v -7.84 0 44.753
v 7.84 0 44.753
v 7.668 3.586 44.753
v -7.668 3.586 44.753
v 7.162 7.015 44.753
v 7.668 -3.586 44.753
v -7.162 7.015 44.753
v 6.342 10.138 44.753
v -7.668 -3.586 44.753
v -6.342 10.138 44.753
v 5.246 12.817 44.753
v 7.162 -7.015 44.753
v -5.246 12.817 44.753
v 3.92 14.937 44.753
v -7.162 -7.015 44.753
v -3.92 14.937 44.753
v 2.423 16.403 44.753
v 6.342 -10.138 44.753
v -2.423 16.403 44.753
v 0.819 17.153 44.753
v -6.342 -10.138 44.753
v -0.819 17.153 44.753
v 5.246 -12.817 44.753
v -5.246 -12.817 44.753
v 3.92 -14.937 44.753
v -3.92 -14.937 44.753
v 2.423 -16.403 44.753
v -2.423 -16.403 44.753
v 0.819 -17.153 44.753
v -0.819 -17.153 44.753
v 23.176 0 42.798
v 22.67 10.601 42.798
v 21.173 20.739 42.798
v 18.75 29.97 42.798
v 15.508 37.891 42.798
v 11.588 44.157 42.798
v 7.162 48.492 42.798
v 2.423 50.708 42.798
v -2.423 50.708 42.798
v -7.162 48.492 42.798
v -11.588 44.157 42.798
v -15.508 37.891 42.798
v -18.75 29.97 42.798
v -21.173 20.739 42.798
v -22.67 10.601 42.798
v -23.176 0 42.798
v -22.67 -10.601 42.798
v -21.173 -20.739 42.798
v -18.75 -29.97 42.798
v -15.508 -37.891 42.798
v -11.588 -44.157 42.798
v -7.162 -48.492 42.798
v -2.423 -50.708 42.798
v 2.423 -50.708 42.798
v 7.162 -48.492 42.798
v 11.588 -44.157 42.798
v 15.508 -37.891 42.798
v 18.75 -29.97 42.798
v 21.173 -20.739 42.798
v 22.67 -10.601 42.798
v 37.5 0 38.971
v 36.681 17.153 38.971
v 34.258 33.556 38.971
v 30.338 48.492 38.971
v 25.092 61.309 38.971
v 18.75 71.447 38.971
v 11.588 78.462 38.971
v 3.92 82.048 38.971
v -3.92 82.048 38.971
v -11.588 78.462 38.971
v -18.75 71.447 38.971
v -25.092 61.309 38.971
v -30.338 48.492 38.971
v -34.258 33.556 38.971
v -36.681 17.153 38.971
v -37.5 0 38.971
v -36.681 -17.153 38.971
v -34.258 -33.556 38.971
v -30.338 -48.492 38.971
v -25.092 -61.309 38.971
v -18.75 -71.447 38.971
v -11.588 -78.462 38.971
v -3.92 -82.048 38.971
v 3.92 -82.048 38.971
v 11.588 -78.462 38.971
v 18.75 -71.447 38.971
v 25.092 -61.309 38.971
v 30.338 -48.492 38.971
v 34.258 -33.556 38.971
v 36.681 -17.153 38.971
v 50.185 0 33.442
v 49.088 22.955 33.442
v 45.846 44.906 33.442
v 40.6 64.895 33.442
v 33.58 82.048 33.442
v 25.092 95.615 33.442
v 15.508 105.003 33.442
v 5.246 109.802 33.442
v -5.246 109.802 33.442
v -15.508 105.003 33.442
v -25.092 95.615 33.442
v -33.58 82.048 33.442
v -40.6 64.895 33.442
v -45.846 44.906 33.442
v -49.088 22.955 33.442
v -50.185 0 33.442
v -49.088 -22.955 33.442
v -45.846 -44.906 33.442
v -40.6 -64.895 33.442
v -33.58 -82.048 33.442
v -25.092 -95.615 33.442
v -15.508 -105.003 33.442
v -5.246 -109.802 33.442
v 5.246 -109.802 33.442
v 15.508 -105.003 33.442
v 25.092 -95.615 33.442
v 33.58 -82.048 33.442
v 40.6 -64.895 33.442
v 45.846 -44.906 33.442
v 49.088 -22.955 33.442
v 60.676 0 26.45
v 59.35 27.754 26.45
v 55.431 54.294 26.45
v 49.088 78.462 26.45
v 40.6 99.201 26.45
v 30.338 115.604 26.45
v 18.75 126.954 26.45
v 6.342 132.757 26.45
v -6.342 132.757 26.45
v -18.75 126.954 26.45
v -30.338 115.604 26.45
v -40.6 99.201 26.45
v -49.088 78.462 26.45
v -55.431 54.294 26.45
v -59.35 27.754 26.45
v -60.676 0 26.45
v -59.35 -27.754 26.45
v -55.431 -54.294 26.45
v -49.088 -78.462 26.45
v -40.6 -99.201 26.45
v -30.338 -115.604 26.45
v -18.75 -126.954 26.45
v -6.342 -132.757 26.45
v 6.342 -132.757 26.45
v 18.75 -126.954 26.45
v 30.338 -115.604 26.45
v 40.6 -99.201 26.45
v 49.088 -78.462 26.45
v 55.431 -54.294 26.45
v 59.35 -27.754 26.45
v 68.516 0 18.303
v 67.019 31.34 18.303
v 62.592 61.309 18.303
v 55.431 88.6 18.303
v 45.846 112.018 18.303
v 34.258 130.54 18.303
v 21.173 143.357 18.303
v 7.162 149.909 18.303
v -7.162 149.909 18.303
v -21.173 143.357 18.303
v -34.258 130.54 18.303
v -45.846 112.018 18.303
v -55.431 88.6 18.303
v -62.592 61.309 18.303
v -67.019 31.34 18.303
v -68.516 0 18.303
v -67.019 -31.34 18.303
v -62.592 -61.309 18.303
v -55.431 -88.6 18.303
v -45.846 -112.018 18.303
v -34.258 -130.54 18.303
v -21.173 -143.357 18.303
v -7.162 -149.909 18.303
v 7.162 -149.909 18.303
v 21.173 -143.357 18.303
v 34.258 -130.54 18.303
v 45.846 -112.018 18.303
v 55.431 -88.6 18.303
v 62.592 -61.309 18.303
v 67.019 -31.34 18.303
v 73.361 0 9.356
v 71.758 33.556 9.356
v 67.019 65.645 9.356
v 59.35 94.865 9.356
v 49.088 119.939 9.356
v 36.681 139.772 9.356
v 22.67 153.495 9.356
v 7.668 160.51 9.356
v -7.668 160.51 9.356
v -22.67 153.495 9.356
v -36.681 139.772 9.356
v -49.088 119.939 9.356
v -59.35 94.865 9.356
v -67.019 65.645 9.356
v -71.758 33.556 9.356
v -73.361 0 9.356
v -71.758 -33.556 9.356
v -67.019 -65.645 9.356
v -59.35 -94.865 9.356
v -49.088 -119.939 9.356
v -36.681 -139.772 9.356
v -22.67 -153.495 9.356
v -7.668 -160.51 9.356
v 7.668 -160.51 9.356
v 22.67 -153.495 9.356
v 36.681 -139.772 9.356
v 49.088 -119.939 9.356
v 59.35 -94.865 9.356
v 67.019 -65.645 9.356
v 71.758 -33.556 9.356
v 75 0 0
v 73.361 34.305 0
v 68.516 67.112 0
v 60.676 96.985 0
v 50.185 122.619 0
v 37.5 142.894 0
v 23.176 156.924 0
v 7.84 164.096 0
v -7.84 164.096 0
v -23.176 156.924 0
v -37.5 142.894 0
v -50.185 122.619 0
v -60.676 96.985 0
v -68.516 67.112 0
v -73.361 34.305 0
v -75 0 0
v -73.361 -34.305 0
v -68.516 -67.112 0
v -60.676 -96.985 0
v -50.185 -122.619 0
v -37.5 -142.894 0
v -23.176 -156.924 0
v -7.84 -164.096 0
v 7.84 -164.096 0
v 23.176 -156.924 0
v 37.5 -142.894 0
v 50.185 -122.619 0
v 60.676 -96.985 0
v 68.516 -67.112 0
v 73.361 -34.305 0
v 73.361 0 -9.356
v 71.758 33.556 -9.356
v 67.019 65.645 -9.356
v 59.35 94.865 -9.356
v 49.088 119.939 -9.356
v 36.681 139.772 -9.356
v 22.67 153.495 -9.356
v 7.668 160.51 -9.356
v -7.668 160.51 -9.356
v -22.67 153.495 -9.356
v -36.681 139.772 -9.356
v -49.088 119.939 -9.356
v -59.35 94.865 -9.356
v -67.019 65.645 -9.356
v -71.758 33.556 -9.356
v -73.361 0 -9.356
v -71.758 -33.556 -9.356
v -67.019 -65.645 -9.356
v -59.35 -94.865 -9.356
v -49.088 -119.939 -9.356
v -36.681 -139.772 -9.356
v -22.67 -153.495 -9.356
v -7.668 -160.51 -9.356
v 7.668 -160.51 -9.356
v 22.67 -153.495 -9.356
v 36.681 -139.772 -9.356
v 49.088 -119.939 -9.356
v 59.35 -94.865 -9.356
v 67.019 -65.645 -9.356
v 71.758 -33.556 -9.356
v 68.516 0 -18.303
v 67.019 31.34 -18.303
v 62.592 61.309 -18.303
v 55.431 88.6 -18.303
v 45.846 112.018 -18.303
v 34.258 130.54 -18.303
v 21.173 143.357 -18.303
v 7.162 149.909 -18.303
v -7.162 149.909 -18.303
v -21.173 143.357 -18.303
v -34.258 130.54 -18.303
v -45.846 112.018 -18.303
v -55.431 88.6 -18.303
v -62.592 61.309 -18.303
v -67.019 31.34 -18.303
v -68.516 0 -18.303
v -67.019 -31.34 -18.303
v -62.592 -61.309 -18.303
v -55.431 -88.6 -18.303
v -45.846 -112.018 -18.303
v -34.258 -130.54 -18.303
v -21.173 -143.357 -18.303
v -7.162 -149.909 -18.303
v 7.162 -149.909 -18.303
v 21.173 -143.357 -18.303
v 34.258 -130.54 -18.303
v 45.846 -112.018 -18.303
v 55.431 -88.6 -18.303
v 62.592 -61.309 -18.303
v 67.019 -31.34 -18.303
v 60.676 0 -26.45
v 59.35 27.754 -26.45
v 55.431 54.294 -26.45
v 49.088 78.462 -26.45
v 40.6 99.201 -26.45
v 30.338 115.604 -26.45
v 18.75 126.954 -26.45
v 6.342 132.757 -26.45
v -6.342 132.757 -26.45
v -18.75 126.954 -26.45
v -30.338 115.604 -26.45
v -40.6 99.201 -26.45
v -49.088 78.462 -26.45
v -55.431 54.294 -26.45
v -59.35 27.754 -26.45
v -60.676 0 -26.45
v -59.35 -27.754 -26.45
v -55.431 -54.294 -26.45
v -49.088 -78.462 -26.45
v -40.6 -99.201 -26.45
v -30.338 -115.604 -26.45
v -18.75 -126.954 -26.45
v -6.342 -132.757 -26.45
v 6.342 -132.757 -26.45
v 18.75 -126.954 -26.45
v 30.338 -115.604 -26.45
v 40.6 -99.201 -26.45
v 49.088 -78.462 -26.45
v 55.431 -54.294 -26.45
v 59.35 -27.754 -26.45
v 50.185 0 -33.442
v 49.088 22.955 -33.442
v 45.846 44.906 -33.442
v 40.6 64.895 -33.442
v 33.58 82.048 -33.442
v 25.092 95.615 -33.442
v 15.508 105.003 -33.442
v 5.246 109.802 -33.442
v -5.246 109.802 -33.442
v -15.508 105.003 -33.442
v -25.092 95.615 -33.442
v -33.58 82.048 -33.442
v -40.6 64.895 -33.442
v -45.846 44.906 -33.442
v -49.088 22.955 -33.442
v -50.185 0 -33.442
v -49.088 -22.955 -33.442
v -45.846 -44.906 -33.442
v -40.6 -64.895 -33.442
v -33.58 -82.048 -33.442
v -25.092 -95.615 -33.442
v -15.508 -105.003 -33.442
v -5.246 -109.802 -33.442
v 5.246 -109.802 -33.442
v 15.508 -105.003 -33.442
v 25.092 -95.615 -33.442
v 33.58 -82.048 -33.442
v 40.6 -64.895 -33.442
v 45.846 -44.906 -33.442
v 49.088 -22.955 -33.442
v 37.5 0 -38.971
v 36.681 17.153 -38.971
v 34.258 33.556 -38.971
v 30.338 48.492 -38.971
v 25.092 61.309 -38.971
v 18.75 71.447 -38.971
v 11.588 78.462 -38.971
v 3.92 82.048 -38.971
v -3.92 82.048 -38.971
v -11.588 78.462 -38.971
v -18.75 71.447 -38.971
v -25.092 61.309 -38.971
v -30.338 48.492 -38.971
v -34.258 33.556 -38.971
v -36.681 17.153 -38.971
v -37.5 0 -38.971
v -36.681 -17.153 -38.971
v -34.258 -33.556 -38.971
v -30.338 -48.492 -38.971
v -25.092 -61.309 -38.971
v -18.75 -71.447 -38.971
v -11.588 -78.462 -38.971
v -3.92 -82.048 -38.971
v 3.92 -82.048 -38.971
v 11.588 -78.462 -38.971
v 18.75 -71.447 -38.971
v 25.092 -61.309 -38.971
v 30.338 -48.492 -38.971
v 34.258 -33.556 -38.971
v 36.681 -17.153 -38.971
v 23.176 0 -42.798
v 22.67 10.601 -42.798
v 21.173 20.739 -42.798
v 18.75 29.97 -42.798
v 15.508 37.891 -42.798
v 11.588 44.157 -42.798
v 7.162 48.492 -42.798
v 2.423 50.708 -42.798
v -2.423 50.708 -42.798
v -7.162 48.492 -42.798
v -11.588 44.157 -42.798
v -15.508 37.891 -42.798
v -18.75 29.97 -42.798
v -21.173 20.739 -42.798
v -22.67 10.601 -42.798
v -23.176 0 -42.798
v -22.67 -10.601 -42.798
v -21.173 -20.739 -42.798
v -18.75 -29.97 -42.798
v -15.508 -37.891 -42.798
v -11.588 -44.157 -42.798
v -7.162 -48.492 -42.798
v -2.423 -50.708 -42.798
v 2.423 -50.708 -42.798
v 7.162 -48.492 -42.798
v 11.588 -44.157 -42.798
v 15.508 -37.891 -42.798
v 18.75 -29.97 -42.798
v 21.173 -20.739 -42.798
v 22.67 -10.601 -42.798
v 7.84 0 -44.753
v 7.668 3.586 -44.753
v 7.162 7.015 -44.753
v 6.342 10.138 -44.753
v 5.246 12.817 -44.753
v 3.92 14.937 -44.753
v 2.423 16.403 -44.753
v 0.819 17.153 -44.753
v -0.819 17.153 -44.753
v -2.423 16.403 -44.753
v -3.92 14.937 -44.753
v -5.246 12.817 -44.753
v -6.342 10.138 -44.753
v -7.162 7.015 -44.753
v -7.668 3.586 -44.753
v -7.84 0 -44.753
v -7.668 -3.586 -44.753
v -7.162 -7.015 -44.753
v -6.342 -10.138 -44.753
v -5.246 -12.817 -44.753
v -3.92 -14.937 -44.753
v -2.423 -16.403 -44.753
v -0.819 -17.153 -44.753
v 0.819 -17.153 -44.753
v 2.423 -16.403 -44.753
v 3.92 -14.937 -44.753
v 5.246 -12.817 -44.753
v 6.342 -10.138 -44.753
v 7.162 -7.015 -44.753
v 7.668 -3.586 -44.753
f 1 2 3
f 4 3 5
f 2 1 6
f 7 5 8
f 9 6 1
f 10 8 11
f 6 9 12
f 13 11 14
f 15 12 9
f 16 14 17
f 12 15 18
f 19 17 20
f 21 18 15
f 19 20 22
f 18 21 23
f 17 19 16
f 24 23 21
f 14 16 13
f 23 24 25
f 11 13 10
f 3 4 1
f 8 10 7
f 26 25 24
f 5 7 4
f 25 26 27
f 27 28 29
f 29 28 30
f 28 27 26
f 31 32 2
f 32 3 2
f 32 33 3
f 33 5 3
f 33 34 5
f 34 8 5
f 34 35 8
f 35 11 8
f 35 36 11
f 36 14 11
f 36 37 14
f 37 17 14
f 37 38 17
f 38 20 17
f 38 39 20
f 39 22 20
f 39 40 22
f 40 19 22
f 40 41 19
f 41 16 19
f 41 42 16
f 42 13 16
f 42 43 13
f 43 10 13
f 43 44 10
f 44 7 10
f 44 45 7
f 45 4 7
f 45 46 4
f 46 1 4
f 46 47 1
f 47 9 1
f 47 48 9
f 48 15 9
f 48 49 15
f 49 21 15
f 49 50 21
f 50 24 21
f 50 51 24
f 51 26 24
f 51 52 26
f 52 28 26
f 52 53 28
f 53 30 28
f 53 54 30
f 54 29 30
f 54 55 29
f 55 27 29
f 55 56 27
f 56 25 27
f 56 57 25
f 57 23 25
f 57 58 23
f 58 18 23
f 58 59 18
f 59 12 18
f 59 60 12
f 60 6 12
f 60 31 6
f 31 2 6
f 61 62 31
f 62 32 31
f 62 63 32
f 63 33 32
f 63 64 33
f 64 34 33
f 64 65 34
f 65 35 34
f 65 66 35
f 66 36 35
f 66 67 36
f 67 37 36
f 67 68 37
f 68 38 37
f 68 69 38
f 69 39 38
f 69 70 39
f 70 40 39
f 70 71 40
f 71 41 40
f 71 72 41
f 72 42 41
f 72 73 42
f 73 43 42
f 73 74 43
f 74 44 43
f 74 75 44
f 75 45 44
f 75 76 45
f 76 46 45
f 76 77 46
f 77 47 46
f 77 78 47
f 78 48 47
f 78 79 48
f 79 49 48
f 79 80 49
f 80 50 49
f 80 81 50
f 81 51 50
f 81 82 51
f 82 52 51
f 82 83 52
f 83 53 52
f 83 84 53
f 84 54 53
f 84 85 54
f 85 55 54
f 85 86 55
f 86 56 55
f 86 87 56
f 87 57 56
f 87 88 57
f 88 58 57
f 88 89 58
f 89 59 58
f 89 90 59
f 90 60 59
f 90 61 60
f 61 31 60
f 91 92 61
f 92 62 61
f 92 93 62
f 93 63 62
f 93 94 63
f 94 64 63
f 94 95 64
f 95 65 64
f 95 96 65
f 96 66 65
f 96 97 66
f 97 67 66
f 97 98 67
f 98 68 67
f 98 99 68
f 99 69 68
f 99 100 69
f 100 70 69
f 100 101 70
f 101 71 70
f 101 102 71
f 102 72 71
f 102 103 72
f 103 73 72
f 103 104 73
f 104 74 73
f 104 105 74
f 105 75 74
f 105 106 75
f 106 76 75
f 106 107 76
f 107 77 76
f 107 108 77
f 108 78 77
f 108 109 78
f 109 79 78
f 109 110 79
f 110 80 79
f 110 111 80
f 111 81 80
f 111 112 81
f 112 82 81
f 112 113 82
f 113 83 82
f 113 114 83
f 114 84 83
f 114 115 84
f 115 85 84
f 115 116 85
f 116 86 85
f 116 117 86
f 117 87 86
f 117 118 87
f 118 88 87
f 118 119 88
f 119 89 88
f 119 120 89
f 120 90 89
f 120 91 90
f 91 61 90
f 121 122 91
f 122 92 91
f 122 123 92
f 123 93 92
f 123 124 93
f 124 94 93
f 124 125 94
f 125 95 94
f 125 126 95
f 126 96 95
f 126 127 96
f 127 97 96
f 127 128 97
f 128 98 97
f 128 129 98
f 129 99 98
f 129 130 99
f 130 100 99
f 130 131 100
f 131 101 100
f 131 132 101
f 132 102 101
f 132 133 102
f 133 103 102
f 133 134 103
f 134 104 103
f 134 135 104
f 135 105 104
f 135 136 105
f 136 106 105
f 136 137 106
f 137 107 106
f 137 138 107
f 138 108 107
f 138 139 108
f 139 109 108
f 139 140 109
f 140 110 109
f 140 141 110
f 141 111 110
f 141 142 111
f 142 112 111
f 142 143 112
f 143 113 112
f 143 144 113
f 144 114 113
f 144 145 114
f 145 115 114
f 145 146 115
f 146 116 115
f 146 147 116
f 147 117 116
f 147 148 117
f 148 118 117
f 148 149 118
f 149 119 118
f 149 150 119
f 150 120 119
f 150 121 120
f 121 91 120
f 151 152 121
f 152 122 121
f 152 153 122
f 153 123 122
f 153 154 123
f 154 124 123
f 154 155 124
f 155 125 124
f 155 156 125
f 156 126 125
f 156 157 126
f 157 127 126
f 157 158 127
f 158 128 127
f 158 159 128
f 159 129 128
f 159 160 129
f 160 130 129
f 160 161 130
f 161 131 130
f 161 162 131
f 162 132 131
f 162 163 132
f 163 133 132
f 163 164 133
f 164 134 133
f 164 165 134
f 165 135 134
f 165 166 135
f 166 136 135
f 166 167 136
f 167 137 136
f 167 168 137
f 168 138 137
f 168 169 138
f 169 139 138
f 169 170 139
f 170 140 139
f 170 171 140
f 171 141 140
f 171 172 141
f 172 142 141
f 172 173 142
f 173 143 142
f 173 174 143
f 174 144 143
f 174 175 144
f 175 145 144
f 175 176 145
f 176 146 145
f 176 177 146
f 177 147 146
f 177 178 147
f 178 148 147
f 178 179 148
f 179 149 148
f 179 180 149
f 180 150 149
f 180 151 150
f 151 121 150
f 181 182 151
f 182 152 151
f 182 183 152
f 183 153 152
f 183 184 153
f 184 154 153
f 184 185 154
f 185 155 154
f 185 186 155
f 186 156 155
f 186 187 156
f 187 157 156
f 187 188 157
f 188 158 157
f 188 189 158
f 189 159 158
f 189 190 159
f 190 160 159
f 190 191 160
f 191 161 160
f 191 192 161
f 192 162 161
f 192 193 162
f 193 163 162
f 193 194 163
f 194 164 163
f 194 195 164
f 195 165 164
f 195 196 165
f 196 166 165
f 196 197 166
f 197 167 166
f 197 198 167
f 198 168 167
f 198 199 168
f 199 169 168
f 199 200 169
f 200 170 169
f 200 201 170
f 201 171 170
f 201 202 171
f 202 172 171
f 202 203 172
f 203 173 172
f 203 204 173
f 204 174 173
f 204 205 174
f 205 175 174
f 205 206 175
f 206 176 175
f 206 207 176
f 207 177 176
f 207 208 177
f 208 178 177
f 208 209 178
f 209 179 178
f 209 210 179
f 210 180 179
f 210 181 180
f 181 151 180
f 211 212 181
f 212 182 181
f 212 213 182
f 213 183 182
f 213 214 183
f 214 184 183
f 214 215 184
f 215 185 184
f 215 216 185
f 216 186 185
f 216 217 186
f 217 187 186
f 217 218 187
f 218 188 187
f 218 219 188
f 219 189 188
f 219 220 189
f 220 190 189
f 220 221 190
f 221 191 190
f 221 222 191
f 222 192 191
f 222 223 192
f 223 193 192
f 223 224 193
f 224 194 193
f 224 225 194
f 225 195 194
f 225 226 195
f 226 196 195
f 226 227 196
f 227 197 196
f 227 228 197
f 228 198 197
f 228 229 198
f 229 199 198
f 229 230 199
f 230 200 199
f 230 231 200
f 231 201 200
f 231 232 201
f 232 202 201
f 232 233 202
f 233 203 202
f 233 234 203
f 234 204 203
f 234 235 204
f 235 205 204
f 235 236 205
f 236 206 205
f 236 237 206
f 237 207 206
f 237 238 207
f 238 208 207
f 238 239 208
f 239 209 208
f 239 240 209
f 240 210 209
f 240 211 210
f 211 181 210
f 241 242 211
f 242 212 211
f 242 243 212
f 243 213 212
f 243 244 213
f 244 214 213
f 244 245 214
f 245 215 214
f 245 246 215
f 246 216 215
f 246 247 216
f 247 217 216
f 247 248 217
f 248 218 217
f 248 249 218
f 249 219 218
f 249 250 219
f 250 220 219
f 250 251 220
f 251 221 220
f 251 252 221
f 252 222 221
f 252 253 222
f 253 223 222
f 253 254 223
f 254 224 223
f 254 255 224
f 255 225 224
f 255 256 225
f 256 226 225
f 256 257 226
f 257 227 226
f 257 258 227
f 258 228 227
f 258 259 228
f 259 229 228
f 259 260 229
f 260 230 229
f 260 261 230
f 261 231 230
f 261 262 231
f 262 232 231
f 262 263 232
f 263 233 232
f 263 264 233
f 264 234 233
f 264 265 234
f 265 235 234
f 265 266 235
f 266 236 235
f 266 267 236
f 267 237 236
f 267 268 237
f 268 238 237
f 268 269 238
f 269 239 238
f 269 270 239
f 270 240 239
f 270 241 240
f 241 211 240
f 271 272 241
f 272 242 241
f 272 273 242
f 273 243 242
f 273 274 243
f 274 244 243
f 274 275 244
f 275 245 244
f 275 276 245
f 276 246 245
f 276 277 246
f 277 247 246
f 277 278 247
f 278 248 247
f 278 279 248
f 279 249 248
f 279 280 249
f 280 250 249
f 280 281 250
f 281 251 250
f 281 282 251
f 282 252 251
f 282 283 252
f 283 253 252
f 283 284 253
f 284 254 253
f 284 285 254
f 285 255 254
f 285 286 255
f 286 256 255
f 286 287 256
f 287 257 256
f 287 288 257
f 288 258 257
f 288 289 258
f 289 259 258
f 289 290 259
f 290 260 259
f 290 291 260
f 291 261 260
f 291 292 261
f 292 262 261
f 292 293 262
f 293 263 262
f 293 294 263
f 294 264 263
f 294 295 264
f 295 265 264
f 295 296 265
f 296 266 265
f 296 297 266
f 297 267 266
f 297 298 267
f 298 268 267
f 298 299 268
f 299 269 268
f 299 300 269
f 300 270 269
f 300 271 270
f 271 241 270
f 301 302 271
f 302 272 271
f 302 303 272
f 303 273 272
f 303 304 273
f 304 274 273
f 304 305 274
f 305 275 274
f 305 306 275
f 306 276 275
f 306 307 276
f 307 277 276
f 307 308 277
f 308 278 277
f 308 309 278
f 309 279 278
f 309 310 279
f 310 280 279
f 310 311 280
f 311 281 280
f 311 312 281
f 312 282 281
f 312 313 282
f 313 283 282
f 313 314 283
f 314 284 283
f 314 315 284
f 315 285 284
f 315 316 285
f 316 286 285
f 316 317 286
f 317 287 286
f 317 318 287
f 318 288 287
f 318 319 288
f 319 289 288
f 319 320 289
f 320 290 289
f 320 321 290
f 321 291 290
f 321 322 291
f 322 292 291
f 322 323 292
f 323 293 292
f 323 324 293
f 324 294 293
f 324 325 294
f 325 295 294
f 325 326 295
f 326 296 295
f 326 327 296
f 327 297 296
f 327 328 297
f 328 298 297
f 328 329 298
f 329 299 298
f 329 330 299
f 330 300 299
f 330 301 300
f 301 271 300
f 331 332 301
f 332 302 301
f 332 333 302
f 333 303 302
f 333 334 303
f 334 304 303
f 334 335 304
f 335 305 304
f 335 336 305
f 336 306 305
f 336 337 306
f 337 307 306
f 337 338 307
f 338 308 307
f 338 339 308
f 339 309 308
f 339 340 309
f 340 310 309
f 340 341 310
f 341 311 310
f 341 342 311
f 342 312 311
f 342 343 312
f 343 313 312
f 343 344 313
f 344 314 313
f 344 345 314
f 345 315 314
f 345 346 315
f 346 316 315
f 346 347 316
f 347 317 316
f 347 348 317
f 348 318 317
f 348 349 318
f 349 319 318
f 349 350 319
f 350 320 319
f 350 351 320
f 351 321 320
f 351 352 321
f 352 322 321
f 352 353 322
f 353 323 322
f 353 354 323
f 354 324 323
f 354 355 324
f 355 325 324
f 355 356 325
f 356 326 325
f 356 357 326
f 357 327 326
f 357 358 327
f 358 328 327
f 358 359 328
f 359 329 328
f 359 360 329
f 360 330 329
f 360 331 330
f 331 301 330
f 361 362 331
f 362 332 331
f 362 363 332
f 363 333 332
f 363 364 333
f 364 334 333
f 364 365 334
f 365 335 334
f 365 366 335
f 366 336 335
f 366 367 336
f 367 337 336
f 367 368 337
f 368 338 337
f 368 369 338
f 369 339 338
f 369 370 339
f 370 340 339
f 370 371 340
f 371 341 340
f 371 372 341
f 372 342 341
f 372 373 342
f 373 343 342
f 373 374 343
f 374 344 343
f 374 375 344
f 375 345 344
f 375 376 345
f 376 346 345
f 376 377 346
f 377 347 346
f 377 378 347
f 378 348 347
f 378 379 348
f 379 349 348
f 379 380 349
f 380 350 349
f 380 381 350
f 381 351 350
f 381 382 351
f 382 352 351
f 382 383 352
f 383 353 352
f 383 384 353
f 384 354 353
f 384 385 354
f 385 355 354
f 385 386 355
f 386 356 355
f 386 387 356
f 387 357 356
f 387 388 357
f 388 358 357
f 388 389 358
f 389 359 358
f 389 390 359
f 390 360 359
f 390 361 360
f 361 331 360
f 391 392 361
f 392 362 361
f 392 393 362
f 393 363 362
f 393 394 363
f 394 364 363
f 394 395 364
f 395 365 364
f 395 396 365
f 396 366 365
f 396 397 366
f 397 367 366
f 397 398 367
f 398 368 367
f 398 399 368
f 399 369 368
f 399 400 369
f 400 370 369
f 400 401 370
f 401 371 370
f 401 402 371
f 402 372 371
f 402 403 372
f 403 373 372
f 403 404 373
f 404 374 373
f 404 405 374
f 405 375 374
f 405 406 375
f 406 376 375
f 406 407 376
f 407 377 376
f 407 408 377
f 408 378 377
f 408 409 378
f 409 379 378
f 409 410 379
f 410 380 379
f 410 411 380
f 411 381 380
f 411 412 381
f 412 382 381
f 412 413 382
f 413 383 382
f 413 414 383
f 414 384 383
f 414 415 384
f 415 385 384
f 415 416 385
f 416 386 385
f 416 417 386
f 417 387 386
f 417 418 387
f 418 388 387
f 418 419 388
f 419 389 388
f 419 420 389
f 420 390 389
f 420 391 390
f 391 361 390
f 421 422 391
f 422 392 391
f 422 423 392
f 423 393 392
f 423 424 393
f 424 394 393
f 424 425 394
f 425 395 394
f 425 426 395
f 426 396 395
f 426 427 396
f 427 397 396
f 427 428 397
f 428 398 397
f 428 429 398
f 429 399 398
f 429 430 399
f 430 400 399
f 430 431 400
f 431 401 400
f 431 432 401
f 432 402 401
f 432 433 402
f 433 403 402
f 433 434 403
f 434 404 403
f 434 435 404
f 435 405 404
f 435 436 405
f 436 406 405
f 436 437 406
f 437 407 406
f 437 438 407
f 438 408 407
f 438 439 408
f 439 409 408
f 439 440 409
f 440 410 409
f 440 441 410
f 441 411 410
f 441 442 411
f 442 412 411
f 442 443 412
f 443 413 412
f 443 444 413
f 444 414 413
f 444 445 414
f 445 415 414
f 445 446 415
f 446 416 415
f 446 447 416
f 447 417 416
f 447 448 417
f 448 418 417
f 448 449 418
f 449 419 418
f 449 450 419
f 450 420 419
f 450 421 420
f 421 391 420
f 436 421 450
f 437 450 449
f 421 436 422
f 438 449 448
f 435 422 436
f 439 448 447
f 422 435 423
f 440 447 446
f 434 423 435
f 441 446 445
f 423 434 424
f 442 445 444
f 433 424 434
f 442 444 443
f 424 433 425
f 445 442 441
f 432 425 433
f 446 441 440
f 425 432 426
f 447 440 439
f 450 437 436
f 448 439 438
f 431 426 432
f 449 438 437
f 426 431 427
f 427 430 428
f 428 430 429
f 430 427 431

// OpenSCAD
// Generated by SolidPython 1.0.1 on 2020-07-29 00:46:46


scale(v = [5, 11, 3]) {
	sphere(r = 15);
}
/***********************************************
*********      SolidPython code:      **********
************************************************
 
# import packages: SolidPython
from solid import *
from solid.utils import *
from itertools import chain, combinations, permutations


class Resize:

    def __init__(self, scad_file):
        self.scad_file = scad_file
        #self.scad_file = import_scad(scad_file)
        # cone/cylinder param:
        self.r1 = 0
        self.r2 = 0
        self.h = 0
        # rectangular prism param:
        self.w = 0
        self.l = 0
        # ellipse param:
        self.r = 0

    # import OpenScad code (file name corresponds to shape)


    # classify shape + parameters
    def assign(self, param1, param2, param3):
        if self.scad_file == 'cone.scad':
            self.r1 = param1
            self.r2 = param2
            self.h = param3
        elif self.scad_file == 'cylinder.scad':
            self.r1 = param1
            self.r2 = param2
            self.h = param3
        elif self.scad_file == 'rectangularPrism.scad':
            self.h = param1
            self.l = param2
            self.w = param3
        else:
            self.r = param1
            self.h = param2

    # resize parameters
    def iterate(self):
        x = range(3, 20, 2)
        i = 1
        if self.scad_file == 'cone.scad':
            tempList = list(permutations(x, 2))
            for temp in tempList:
                param1 = temp[0]
                param2 = temp[1]
                filepath = 'produced_scad_files/' + 'cone' + str(param1) + '_' + str(param2) + '_' + '.scad'
                scad_render_to_file(cylinder(h=param1, r1=param2, r2=0), filepath)

        elif self.scad_file == 'cylinder.scad':
            tempList = list(permutations(x, 3))
            for temp in tempList:
                param1 = temp[0]
                param2 = temp[1]
                filepath = 'produced_scad_files/' + 'cylinder' + str(param1) + '_' + str(param2) + '_' + '.scad'
                scad_render_to_file(cylinder(h=param1, r1=param2, r2=param2), filepath)

        elif self.scad_file == 'rectangularPrism.scad':
            tempList = list(permutations(x, 3))
            for temp in tempList:
                param1 = temp[0]
                param2 = temp[1]
                param3 = temp[2]
                filepath = 'produced_scad_files/' + 'rectangularPrism' + str(param1) + '_' + str(param2) + '_' + str(
                    param3) + '.scad'
                scad_render_to_file(cube(size=(param1, param2, param3)), filepath)

        elif self.scad_file == 'ellipse.scad':
            tempList = list(permutations(x, 4))
            for temp in tempList:
                param1 = temp[0]
                param2 = temp[1]
                param3 = temp[2]
                param4 = temp[3]
                filepath = 'produced_scad_files/' + 'ellipse' + str(param1) + '_' + str(param2) + '_' + str(param3) + '_' + str(param4) + '.scad'
                scad_render_to_file(scale([param1, param2, param3])(sphere(r=param4)), filepath)

    def render_to_scadfile(self):
        scad_render_to_file(scad, 'example.scad') 
 
************************************************/
